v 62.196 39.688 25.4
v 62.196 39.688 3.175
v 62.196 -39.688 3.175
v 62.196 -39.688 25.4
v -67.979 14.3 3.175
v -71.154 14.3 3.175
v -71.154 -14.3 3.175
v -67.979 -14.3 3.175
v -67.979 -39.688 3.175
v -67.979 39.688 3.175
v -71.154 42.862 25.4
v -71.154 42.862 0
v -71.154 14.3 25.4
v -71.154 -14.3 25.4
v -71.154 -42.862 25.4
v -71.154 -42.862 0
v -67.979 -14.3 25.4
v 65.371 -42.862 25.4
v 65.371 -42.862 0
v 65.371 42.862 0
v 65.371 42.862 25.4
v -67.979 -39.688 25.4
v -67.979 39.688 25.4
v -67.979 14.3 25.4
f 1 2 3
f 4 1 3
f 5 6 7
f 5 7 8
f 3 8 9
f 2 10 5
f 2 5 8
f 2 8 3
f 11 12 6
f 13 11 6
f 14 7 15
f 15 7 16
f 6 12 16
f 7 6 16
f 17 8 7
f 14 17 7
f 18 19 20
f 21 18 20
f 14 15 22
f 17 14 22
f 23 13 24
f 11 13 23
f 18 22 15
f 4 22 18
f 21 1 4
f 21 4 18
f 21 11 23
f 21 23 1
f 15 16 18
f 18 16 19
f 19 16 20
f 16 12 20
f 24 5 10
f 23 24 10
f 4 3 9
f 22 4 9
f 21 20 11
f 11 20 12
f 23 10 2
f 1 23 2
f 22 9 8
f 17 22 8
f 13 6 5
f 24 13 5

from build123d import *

# Parameters (mm, degrees)
F1_DEPTH = 3.175
F2_DEPTH = 25.4


with BuildPart() as f1:
    # F0 (on Top) → F1 (new body)
    with BuildSketch(Plane.XY):
        Polygon((62.195573, -39.6875), (62.195573, 39.6875), (-67.979427, 39.6875), (-67.979427, 14.3002), (-67.979427, 0), (-67.979427, -14.3002), (-67.979427, -39.6875), (-2.891927, -39.6875), align=None)
        Polygon((-67.979427, 0), (-67.979427, 14.3002), (-71.154427, 14.3002), (-71.154427, -14.3002), (-67.979427, -14.3002), align=None)
    extrude(amount=F1_DEPTH)

    # F0 (on Top) → F2 (join)
    with BuildSketch(Plane.XY):
        Polygon((-67.979427, 39.6875), (62.195573, 39.6875), (62.195573, -39.6875), (-2.891927, -39.6875), (-67.979427, -39.6875), (-67.979427, -14.3002), (-71.154427, -14.3002), (-71.154427, -42.8625), (65.370573, -42.8625), (65.370573, 42.8625), (-71.154427, 42.8625), (-71.154427, 14.3002), (-67.979427, 14.3002), align=None)
    extrude(amount=F2_DEPTH)


solid = f1.part
